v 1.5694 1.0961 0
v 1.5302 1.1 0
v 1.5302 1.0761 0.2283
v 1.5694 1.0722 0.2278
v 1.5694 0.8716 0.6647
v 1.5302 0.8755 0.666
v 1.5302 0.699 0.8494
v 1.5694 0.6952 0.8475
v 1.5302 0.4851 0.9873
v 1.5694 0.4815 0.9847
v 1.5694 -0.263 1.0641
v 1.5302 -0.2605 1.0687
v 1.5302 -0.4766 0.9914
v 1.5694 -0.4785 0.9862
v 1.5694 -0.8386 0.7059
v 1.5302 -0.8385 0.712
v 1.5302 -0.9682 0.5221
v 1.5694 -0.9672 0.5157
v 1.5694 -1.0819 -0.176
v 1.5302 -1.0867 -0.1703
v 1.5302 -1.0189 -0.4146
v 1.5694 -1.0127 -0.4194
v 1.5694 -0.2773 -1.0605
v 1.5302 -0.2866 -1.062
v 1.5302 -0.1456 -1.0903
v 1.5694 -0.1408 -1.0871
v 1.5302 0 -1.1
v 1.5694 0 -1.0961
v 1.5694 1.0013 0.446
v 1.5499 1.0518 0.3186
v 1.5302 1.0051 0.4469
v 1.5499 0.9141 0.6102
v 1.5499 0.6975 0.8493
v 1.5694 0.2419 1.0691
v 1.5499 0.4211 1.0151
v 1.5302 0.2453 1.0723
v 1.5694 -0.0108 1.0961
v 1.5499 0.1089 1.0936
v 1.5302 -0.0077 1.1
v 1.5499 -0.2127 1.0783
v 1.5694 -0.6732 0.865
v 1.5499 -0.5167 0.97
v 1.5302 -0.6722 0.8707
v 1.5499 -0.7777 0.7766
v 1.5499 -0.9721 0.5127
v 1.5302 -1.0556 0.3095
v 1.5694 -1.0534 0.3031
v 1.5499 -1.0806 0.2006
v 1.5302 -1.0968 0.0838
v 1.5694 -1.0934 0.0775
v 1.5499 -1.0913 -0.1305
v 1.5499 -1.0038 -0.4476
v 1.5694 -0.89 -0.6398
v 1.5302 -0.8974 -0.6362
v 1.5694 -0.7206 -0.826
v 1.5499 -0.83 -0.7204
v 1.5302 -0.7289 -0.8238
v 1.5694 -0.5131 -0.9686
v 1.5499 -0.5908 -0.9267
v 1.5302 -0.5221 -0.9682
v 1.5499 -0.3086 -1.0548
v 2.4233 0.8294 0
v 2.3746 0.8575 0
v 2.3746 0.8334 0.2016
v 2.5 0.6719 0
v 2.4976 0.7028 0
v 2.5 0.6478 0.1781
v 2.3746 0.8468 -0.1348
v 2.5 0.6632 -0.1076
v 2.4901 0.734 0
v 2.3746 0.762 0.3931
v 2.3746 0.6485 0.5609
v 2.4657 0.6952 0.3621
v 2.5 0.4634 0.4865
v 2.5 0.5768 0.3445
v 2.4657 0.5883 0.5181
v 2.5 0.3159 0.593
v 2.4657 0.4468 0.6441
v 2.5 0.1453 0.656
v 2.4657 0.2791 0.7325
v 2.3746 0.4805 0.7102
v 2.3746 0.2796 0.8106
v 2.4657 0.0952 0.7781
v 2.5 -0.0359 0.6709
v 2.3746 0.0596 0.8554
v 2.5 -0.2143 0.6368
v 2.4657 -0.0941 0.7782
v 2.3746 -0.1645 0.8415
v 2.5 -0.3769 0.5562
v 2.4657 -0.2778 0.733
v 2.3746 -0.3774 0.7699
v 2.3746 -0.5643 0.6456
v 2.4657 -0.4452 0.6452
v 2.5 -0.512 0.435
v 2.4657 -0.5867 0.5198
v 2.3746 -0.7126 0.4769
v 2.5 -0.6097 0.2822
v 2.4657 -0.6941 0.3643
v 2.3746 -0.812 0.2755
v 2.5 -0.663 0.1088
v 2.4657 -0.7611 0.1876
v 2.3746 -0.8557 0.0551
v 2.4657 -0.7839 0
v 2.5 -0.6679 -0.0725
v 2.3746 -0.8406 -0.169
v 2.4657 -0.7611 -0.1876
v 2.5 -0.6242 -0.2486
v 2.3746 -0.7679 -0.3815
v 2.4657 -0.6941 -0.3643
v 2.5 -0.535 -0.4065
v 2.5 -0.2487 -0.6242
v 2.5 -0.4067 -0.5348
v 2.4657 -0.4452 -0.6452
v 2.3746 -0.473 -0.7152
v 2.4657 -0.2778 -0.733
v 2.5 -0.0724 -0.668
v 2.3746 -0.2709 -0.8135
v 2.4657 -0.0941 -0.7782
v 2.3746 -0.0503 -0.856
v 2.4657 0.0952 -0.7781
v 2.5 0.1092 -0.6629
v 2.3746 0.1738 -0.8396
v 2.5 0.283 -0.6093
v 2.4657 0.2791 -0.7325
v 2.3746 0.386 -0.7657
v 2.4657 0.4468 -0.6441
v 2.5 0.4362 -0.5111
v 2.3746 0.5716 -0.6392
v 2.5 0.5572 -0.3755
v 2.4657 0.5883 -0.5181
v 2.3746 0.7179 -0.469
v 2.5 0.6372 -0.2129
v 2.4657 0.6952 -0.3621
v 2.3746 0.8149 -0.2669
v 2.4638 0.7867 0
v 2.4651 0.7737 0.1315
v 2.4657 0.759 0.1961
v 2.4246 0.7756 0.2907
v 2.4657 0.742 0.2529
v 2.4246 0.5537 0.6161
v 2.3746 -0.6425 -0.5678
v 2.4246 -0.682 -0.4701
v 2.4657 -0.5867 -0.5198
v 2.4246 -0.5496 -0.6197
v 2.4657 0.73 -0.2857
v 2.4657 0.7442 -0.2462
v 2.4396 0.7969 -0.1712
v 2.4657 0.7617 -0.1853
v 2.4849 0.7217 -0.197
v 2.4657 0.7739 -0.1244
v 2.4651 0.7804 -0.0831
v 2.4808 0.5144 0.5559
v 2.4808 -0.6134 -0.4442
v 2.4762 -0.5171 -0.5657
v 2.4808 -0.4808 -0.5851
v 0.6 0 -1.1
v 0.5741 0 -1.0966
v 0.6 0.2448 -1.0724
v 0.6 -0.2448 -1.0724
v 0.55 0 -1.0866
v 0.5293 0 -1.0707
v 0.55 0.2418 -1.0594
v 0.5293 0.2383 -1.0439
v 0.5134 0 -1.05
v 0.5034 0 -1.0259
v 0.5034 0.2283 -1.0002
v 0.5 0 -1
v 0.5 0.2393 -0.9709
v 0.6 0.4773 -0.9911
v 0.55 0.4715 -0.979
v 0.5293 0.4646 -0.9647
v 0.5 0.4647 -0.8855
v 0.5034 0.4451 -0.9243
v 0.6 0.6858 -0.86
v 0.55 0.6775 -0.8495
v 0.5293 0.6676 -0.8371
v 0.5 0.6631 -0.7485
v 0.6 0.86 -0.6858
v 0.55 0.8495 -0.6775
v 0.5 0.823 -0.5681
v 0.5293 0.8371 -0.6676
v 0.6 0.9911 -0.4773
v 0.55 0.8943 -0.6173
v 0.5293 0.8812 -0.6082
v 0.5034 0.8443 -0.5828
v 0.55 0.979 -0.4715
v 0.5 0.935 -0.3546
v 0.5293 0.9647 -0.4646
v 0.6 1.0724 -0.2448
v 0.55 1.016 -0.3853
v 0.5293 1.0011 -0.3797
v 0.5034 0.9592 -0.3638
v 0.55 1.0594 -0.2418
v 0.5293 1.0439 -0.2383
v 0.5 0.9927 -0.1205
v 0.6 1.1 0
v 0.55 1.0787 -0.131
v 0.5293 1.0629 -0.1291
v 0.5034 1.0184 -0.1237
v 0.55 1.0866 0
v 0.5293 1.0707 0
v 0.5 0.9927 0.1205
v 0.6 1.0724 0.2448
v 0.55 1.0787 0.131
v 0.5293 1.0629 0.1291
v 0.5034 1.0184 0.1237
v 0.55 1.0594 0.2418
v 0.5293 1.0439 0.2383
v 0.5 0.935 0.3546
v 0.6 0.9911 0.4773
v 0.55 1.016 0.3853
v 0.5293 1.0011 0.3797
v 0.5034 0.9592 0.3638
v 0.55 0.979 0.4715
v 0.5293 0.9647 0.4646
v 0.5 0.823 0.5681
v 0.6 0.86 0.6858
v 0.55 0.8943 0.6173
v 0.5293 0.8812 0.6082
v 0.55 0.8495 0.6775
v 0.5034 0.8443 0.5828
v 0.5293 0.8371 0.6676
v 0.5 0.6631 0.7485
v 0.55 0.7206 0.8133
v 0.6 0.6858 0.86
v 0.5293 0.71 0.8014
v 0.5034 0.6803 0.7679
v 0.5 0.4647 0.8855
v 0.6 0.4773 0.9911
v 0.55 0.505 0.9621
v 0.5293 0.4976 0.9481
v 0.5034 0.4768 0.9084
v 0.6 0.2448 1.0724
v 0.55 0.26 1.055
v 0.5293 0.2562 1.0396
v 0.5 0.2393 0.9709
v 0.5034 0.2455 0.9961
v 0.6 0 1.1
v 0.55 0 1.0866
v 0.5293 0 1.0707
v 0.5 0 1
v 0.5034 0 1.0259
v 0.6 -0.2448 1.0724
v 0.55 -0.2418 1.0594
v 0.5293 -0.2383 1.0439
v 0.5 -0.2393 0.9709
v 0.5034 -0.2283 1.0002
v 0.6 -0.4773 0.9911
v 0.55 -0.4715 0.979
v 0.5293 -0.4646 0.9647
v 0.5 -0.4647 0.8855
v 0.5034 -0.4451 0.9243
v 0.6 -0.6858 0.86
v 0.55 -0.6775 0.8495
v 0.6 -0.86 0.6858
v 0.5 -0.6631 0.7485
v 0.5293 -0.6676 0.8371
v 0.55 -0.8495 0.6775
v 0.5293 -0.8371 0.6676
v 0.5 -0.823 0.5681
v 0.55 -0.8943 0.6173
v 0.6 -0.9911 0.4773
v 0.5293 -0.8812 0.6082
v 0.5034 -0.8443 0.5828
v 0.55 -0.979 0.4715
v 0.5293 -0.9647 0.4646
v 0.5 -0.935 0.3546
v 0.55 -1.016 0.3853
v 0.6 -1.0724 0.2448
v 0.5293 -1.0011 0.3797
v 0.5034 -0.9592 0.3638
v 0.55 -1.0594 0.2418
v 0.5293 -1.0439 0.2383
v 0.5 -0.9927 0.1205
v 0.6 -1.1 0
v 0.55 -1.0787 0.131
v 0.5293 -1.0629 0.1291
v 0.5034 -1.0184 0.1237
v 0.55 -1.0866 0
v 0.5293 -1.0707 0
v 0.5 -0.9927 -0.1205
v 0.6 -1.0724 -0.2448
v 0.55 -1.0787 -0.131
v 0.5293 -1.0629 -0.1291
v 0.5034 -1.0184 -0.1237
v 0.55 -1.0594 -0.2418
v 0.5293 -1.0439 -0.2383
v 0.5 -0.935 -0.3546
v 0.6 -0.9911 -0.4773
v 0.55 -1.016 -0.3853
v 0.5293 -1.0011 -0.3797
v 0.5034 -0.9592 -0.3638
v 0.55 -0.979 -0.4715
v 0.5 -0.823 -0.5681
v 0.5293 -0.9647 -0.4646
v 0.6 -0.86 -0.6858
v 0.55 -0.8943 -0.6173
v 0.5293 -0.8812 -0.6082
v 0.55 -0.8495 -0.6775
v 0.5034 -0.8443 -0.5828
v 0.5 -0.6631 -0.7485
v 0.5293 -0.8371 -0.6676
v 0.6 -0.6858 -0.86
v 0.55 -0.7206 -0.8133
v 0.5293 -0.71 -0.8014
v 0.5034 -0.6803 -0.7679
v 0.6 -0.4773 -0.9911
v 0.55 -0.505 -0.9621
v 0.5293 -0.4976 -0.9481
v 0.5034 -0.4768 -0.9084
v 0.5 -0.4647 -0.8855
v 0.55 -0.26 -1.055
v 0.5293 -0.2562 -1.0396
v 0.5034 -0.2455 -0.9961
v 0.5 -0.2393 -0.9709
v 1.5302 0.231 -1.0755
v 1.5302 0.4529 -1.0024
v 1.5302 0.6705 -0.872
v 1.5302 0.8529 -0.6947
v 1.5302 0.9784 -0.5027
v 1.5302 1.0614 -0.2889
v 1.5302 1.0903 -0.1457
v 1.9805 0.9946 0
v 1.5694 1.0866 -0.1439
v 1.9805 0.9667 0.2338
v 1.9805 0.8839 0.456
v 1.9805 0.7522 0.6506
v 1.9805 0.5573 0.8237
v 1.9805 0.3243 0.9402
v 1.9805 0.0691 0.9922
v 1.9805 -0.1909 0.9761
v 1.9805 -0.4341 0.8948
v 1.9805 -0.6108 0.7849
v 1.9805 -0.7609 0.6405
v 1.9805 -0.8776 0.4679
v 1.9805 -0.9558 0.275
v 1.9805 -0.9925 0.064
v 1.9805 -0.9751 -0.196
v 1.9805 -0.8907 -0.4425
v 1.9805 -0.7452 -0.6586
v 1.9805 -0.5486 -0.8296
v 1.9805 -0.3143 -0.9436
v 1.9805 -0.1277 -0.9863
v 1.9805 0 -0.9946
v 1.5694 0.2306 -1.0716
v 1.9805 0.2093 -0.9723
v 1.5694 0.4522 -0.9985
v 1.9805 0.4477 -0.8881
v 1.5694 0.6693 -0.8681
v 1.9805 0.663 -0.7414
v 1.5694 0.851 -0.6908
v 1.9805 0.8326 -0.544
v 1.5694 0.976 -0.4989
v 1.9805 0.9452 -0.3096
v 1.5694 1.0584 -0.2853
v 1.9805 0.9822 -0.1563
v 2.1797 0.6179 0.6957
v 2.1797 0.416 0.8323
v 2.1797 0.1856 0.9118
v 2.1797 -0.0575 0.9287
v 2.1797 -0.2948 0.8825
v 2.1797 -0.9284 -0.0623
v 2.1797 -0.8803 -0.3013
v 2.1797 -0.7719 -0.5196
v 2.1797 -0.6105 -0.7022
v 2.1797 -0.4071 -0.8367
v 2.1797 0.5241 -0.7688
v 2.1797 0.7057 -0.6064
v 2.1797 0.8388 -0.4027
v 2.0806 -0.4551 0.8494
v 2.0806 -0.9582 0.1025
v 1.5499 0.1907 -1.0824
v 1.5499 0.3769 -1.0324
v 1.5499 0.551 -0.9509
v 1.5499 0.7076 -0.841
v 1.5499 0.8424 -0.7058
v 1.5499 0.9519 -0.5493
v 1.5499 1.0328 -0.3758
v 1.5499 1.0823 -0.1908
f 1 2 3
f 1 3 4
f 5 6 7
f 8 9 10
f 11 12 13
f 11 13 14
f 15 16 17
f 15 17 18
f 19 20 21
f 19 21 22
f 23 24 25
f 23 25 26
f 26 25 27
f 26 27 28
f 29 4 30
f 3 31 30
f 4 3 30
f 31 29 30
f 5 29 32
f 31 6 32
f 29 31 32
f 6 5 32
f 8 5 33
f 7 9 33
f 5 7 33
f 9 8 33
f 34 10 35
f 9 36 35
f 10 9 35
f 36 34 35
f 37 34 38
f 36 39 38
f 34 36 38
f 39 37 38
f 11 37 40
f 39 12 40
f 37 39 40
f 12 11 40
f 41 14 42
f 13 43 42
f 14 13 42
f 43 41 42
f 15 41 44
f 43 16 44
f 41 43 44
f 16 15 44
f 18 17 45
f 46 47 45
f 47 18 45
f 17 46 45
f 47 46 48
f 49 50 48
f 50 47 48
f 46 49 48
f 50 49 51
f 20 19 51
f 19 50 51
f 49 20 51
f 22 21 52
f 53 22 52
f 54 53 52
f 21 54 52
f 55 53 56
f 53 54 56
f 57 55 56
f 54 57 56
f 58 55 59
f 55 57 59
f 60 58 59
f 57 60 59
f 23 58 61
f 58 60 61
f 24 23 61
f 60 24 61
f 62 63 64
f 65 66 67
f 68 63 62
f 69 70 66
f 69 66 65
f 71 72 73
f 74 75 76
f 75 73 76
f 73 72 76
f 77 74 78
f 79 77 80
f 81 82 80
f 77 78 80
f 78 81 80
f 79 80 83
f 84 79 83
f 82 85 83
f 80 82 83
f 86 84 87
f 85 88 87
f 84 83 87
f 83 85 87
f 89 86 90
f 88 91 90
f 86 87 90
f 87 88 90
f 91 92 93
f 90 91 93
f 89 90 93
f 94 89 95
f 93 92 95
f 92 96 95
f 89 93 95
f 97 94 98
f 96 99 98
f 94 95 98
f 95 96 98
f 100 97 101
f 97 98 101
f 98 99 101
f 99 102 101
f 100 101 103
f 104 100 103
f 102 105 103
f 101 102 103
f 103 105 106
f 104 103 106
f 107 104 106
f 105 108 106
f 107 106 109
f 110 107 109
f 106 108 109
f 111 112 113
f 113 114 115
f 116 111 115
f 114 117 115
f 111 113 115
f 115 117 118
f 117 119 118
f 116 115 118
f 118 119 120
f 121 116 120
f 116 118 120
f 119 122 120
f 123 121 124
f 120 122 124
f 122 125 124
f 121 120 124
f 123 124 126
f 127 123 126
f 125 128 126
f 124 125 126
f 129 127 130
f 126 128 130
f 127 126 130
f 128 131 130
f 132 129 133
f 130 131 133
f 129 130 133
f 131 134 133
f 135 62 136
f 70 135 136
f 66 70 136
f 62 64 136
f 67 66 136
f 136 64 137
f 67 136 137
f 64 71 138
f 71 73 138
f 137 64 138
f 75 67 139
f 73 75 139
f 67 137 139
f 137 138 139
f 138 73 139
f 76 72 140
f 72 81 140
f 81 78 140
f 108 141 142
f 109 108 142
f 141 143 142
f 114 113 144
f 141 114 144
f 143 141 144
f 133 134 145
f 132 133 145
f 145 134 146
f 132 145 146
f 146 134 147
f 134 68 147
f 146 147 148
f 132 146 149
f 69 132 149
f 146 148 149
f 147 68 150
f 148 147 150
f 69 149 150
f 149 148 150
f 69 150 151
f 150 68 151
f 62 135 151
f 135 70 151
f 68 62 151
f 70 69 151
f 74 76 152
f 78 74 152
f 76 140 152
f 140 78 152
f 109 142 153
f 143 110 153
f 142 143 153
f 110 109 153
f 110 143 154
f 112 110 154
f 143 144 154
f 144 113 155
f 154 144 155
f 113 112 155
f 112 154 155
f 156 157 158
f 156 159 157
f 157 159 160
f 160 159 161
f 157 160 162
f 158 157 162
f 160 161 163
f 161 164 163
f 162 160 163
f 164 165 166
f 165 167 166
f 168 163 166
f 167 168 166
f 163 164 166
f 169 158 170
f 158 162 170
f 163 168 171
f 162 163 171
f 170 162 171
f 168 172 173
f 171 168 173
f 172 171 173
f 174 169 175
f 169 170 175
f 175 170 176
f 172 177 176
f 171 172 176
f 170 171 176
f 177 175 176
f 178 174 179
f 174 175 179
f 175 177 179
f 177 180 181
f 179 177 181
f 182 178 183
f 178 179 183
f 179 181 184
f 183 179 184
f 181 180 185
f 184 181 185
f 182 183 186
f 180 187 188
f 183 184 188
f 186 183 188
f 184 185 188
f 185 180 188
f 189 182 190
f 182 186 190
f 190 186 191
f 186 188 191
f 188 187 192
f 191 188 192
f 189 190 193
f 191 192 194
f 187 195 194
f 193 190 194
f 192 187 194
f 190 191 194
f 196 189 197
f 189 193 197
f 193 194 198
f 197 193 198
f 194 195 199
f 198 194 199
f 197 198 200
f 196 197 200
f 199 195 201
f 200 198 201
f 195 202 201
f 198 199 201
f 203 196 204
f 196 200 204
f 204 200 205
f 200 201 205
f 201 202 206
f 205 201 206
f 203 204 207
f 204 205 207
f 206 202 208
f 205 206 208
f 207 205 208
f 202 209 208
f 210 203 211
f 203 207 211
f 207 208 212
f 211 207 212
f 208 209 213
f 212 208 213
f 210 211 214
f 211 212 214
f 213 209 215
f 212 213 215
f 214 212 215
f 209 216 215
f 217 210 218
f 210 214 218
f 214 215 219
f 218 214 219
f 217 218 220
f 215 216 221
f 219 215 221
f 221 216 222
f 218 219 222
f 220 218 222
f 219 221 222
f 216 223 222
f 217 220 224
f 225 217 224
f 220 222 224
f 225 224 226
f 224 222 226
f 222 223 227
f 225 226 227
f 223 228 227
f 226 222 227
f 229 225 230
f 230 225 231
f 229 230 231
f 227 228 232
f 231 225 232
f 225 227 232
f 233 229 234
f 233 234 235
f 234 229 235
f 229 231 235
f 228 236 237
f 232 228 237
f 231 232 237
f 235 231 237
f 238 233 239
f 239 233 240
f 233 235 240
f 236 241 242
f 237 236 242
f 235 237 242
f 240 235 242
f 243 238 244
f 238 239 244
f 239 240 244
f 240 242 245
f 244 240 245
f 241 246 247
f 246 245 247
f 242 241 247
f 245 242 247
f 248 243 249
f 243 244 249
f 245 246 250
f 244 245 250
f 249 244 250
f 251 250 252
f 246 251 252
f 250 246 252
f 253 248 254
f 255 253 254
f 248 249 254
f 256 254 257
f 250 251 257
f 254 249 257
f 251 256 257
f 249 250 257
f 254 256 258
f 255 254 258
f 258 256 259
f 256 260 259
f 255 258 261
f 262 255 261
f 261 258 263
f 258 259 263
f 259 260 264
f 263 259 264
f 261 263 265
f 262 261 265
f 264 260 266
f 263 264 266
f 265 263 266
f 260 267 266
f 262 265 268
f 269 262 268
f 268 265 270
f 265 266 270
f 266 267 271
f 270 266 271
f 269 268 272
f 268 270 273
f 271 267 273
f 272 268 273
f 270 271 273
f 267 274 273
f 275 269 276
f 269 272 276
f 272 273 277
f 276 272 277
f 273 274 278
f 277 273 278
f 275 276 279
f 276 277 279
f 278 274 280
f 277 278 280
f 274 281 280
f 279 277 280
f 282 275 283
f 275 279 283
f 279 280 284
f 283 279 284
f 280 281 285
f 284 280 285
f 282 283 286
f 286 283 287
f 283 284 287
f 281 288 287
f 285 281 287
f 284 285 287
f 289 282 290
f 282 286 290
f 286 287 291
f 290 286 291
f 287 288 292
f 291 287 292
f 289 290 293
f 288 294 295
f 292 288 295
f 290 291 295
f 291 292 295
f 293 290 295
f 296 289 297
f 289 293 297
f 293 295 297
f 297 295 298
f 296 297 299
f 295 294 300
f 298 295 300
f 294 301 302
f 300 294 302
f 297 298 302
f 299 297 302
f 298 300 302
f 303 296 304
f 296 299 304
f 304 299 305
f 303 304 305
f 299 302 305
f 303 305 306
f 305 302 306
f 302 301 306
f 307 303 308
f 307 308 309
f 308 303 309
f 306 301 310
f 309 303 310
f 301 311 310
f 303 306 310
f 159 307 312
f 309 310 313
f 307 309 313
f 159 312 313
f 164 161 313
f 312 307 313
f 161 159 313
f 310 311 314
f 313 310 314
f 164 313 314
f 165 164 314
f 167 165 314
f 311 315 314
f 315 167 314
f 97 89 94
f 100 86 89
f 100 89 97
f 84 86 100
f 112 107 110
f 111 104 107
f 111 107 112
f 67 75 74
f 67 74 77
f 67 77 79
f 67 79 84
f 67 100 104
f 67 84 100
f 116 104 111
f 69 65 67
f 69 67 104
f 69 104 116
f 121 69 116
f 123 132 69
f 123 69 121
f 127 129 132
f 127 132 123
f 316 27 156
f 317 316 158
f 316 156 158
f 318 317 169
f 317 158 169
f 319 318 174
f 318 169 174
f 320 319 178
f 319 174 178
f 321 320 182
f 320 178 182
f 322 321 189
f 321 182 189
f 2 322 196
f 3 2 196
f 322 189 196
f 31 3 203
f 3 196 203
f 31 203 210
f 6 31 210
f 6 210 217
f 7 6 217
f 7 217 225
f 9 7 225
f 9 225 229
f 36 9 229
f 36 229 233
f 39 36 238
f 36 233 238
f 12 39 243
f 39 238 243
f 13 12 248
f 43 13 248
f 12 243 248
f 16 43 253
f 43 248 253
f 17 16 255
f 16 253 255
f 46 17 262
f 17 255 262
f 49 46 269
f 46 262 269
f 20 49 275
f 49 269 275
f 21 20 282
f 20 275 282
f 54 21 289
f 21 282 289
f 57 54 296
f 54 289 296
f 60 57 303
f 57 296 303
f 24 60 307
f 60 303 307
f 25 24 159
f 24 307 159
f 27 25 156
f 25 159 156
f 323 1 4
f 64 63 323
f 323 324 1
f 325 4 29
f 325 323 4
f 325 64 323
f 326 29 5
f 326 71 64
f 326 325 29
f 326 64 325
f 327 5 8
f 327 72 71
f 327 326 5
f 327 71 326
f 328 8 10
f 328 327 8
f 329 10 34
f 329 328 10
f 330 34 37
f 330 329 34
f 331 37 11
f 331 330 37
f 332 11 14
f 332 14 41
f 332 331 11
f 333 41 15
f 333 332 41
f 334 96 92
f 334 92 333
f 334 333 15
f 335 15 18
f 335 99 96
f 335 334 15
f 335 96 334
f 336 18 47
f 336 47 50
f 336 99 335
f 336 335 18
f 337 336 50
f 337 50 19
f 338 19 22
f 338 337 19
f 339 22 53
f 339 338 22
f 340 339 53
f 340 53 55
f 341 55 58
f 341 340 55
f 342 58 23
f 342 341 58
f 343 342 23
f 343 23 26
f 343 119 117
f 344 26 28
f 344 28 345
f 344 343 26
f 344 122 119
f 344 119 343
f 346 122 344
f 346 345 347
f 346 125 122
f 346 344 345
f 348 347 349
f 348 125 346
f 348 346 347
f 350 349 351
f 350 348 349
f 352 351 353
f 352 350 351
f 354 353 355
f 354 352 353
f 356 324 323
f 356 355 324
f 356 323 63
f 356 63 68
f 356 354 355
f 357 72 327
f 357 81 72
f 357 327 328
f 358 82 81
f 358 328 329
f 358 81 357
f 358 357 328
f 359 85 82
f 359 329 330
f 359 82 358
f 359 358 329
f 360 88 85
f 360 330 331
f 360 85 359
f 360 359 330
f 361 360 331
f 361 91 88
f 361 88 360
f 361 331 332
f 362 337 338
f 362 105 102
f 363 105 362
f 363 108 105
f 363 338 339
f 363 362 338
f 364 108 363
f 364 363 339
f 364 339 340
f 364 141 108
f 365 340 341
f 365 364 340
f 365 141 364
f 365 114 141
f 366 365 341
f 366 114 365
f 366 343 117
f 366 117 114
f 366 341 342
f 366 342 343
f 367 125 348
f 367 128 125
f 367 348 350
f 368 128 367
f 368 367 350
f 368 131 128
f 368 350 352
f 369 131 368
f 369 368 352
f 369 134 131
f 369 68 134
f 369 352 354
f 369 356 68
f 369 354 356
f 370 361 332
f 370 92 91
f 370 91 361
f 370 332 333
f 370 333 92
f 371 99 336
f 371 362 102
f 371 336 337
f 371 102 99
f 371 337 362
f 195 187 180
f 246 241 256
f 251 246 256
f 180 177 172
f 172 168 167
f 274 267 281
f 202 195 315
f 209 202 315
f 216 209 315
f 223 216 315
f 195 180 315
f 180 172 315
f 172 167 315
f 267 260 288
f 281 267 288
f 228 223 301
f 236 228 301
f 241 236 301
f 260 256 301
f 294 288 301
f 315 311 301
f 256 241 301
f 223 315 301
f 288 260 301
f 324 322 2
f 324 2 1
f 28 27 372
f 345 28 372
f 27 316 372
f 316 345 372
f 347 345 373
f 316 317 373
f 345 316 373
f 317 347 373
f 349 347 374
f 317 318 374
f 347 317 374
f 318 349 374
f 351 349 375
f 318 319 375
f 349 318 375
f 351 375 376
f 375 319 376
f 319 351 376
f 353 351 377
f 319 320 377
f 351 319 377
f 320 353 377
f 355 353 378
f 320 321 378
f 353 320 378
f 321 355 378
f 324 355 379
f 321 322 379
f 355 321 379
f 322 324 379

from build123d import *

# Parameters (mm, degrees)
SKETCH1_R           = 1.1
BOSS_EXTRUDE1_DEPTH = 2.5
FILLET1_R           = 0.1
FILLET2_R           = 0.2
SKETCH3_W           = 0.5
SKETCH3_H           = 1.1
FILLET3_R           = 0.1


with BuildPart() as part:
    # Sketch1 → Boss-Extrude1 (new body)
    with BuildSketch(Plane(origin=(0, 0, 0), x_dir=(0, 0, -1), z_dir=(1, 0, 0))):
        Circle(SKETCH1_R)
    extrude(amount=BOSS_EXTRUDE1_DEPTH)

    # Fillet1
    fillet1_edges = [part.edges().sort_by_distance(p)[0] for p in [
        (0, 0, 1.1),
        (2.5, 0, 1.1),
    ]]
    fillet(fillet1_edges, radius=FILLET1_R)

    # Sketch2 → Cut-Revolve2 (revolve, cut)
    with BuildSketch(Plane.XY):
        with BuildLine():
            Line((1.549806351, 1.1), (2.5, 1.1))
            Line((2.5, 1.1), (2.5, 0.804782817))
            add(Edge.make_bspline(
                [(1.549806351, 1.1), (2.048899833, 1.002501981), (2.5, 0.804782817)],
                knots=[0, 0, 0, 0.445191619, 0.445191619, 0.445191619], degree=2))
        make_face()
    revolve(axis=Axis((1.549806351, 0, 0), (1, 0, 0)), mode=Mode.SUBTRACT)

    # Fillet2
    fillet2_edges = [part.edges().sort_by_distance(p)[0] for p in [
        (1.549806351, -0.777817459, 0.777817459),
        (2.5, -0.804782817, 0),
    ]]
    fillet(fillet2_edges, radius=FILLET2_R)

    # Sketch3 → Cut-Revolve3 (revolve, cut)
    with BuildSketch(Plane.XY):
        with Locations((0.25, 0.55)):
            Rectangle(SKETCH3_W, SKETCH3_H)
    revolve(axis=Axis((0.5, 0, 0), (-1, 0, 0)), mode=Mode.SUBTRACT)

    # Fillet3
    fillet3_edges = [part.edges().sort_by_distance(p)[0] for p in [
        (0.5, 0, 1.1),
    ]]
    fillet(fillet3_edges, radius=FILLET3_R)


solid = part.part
